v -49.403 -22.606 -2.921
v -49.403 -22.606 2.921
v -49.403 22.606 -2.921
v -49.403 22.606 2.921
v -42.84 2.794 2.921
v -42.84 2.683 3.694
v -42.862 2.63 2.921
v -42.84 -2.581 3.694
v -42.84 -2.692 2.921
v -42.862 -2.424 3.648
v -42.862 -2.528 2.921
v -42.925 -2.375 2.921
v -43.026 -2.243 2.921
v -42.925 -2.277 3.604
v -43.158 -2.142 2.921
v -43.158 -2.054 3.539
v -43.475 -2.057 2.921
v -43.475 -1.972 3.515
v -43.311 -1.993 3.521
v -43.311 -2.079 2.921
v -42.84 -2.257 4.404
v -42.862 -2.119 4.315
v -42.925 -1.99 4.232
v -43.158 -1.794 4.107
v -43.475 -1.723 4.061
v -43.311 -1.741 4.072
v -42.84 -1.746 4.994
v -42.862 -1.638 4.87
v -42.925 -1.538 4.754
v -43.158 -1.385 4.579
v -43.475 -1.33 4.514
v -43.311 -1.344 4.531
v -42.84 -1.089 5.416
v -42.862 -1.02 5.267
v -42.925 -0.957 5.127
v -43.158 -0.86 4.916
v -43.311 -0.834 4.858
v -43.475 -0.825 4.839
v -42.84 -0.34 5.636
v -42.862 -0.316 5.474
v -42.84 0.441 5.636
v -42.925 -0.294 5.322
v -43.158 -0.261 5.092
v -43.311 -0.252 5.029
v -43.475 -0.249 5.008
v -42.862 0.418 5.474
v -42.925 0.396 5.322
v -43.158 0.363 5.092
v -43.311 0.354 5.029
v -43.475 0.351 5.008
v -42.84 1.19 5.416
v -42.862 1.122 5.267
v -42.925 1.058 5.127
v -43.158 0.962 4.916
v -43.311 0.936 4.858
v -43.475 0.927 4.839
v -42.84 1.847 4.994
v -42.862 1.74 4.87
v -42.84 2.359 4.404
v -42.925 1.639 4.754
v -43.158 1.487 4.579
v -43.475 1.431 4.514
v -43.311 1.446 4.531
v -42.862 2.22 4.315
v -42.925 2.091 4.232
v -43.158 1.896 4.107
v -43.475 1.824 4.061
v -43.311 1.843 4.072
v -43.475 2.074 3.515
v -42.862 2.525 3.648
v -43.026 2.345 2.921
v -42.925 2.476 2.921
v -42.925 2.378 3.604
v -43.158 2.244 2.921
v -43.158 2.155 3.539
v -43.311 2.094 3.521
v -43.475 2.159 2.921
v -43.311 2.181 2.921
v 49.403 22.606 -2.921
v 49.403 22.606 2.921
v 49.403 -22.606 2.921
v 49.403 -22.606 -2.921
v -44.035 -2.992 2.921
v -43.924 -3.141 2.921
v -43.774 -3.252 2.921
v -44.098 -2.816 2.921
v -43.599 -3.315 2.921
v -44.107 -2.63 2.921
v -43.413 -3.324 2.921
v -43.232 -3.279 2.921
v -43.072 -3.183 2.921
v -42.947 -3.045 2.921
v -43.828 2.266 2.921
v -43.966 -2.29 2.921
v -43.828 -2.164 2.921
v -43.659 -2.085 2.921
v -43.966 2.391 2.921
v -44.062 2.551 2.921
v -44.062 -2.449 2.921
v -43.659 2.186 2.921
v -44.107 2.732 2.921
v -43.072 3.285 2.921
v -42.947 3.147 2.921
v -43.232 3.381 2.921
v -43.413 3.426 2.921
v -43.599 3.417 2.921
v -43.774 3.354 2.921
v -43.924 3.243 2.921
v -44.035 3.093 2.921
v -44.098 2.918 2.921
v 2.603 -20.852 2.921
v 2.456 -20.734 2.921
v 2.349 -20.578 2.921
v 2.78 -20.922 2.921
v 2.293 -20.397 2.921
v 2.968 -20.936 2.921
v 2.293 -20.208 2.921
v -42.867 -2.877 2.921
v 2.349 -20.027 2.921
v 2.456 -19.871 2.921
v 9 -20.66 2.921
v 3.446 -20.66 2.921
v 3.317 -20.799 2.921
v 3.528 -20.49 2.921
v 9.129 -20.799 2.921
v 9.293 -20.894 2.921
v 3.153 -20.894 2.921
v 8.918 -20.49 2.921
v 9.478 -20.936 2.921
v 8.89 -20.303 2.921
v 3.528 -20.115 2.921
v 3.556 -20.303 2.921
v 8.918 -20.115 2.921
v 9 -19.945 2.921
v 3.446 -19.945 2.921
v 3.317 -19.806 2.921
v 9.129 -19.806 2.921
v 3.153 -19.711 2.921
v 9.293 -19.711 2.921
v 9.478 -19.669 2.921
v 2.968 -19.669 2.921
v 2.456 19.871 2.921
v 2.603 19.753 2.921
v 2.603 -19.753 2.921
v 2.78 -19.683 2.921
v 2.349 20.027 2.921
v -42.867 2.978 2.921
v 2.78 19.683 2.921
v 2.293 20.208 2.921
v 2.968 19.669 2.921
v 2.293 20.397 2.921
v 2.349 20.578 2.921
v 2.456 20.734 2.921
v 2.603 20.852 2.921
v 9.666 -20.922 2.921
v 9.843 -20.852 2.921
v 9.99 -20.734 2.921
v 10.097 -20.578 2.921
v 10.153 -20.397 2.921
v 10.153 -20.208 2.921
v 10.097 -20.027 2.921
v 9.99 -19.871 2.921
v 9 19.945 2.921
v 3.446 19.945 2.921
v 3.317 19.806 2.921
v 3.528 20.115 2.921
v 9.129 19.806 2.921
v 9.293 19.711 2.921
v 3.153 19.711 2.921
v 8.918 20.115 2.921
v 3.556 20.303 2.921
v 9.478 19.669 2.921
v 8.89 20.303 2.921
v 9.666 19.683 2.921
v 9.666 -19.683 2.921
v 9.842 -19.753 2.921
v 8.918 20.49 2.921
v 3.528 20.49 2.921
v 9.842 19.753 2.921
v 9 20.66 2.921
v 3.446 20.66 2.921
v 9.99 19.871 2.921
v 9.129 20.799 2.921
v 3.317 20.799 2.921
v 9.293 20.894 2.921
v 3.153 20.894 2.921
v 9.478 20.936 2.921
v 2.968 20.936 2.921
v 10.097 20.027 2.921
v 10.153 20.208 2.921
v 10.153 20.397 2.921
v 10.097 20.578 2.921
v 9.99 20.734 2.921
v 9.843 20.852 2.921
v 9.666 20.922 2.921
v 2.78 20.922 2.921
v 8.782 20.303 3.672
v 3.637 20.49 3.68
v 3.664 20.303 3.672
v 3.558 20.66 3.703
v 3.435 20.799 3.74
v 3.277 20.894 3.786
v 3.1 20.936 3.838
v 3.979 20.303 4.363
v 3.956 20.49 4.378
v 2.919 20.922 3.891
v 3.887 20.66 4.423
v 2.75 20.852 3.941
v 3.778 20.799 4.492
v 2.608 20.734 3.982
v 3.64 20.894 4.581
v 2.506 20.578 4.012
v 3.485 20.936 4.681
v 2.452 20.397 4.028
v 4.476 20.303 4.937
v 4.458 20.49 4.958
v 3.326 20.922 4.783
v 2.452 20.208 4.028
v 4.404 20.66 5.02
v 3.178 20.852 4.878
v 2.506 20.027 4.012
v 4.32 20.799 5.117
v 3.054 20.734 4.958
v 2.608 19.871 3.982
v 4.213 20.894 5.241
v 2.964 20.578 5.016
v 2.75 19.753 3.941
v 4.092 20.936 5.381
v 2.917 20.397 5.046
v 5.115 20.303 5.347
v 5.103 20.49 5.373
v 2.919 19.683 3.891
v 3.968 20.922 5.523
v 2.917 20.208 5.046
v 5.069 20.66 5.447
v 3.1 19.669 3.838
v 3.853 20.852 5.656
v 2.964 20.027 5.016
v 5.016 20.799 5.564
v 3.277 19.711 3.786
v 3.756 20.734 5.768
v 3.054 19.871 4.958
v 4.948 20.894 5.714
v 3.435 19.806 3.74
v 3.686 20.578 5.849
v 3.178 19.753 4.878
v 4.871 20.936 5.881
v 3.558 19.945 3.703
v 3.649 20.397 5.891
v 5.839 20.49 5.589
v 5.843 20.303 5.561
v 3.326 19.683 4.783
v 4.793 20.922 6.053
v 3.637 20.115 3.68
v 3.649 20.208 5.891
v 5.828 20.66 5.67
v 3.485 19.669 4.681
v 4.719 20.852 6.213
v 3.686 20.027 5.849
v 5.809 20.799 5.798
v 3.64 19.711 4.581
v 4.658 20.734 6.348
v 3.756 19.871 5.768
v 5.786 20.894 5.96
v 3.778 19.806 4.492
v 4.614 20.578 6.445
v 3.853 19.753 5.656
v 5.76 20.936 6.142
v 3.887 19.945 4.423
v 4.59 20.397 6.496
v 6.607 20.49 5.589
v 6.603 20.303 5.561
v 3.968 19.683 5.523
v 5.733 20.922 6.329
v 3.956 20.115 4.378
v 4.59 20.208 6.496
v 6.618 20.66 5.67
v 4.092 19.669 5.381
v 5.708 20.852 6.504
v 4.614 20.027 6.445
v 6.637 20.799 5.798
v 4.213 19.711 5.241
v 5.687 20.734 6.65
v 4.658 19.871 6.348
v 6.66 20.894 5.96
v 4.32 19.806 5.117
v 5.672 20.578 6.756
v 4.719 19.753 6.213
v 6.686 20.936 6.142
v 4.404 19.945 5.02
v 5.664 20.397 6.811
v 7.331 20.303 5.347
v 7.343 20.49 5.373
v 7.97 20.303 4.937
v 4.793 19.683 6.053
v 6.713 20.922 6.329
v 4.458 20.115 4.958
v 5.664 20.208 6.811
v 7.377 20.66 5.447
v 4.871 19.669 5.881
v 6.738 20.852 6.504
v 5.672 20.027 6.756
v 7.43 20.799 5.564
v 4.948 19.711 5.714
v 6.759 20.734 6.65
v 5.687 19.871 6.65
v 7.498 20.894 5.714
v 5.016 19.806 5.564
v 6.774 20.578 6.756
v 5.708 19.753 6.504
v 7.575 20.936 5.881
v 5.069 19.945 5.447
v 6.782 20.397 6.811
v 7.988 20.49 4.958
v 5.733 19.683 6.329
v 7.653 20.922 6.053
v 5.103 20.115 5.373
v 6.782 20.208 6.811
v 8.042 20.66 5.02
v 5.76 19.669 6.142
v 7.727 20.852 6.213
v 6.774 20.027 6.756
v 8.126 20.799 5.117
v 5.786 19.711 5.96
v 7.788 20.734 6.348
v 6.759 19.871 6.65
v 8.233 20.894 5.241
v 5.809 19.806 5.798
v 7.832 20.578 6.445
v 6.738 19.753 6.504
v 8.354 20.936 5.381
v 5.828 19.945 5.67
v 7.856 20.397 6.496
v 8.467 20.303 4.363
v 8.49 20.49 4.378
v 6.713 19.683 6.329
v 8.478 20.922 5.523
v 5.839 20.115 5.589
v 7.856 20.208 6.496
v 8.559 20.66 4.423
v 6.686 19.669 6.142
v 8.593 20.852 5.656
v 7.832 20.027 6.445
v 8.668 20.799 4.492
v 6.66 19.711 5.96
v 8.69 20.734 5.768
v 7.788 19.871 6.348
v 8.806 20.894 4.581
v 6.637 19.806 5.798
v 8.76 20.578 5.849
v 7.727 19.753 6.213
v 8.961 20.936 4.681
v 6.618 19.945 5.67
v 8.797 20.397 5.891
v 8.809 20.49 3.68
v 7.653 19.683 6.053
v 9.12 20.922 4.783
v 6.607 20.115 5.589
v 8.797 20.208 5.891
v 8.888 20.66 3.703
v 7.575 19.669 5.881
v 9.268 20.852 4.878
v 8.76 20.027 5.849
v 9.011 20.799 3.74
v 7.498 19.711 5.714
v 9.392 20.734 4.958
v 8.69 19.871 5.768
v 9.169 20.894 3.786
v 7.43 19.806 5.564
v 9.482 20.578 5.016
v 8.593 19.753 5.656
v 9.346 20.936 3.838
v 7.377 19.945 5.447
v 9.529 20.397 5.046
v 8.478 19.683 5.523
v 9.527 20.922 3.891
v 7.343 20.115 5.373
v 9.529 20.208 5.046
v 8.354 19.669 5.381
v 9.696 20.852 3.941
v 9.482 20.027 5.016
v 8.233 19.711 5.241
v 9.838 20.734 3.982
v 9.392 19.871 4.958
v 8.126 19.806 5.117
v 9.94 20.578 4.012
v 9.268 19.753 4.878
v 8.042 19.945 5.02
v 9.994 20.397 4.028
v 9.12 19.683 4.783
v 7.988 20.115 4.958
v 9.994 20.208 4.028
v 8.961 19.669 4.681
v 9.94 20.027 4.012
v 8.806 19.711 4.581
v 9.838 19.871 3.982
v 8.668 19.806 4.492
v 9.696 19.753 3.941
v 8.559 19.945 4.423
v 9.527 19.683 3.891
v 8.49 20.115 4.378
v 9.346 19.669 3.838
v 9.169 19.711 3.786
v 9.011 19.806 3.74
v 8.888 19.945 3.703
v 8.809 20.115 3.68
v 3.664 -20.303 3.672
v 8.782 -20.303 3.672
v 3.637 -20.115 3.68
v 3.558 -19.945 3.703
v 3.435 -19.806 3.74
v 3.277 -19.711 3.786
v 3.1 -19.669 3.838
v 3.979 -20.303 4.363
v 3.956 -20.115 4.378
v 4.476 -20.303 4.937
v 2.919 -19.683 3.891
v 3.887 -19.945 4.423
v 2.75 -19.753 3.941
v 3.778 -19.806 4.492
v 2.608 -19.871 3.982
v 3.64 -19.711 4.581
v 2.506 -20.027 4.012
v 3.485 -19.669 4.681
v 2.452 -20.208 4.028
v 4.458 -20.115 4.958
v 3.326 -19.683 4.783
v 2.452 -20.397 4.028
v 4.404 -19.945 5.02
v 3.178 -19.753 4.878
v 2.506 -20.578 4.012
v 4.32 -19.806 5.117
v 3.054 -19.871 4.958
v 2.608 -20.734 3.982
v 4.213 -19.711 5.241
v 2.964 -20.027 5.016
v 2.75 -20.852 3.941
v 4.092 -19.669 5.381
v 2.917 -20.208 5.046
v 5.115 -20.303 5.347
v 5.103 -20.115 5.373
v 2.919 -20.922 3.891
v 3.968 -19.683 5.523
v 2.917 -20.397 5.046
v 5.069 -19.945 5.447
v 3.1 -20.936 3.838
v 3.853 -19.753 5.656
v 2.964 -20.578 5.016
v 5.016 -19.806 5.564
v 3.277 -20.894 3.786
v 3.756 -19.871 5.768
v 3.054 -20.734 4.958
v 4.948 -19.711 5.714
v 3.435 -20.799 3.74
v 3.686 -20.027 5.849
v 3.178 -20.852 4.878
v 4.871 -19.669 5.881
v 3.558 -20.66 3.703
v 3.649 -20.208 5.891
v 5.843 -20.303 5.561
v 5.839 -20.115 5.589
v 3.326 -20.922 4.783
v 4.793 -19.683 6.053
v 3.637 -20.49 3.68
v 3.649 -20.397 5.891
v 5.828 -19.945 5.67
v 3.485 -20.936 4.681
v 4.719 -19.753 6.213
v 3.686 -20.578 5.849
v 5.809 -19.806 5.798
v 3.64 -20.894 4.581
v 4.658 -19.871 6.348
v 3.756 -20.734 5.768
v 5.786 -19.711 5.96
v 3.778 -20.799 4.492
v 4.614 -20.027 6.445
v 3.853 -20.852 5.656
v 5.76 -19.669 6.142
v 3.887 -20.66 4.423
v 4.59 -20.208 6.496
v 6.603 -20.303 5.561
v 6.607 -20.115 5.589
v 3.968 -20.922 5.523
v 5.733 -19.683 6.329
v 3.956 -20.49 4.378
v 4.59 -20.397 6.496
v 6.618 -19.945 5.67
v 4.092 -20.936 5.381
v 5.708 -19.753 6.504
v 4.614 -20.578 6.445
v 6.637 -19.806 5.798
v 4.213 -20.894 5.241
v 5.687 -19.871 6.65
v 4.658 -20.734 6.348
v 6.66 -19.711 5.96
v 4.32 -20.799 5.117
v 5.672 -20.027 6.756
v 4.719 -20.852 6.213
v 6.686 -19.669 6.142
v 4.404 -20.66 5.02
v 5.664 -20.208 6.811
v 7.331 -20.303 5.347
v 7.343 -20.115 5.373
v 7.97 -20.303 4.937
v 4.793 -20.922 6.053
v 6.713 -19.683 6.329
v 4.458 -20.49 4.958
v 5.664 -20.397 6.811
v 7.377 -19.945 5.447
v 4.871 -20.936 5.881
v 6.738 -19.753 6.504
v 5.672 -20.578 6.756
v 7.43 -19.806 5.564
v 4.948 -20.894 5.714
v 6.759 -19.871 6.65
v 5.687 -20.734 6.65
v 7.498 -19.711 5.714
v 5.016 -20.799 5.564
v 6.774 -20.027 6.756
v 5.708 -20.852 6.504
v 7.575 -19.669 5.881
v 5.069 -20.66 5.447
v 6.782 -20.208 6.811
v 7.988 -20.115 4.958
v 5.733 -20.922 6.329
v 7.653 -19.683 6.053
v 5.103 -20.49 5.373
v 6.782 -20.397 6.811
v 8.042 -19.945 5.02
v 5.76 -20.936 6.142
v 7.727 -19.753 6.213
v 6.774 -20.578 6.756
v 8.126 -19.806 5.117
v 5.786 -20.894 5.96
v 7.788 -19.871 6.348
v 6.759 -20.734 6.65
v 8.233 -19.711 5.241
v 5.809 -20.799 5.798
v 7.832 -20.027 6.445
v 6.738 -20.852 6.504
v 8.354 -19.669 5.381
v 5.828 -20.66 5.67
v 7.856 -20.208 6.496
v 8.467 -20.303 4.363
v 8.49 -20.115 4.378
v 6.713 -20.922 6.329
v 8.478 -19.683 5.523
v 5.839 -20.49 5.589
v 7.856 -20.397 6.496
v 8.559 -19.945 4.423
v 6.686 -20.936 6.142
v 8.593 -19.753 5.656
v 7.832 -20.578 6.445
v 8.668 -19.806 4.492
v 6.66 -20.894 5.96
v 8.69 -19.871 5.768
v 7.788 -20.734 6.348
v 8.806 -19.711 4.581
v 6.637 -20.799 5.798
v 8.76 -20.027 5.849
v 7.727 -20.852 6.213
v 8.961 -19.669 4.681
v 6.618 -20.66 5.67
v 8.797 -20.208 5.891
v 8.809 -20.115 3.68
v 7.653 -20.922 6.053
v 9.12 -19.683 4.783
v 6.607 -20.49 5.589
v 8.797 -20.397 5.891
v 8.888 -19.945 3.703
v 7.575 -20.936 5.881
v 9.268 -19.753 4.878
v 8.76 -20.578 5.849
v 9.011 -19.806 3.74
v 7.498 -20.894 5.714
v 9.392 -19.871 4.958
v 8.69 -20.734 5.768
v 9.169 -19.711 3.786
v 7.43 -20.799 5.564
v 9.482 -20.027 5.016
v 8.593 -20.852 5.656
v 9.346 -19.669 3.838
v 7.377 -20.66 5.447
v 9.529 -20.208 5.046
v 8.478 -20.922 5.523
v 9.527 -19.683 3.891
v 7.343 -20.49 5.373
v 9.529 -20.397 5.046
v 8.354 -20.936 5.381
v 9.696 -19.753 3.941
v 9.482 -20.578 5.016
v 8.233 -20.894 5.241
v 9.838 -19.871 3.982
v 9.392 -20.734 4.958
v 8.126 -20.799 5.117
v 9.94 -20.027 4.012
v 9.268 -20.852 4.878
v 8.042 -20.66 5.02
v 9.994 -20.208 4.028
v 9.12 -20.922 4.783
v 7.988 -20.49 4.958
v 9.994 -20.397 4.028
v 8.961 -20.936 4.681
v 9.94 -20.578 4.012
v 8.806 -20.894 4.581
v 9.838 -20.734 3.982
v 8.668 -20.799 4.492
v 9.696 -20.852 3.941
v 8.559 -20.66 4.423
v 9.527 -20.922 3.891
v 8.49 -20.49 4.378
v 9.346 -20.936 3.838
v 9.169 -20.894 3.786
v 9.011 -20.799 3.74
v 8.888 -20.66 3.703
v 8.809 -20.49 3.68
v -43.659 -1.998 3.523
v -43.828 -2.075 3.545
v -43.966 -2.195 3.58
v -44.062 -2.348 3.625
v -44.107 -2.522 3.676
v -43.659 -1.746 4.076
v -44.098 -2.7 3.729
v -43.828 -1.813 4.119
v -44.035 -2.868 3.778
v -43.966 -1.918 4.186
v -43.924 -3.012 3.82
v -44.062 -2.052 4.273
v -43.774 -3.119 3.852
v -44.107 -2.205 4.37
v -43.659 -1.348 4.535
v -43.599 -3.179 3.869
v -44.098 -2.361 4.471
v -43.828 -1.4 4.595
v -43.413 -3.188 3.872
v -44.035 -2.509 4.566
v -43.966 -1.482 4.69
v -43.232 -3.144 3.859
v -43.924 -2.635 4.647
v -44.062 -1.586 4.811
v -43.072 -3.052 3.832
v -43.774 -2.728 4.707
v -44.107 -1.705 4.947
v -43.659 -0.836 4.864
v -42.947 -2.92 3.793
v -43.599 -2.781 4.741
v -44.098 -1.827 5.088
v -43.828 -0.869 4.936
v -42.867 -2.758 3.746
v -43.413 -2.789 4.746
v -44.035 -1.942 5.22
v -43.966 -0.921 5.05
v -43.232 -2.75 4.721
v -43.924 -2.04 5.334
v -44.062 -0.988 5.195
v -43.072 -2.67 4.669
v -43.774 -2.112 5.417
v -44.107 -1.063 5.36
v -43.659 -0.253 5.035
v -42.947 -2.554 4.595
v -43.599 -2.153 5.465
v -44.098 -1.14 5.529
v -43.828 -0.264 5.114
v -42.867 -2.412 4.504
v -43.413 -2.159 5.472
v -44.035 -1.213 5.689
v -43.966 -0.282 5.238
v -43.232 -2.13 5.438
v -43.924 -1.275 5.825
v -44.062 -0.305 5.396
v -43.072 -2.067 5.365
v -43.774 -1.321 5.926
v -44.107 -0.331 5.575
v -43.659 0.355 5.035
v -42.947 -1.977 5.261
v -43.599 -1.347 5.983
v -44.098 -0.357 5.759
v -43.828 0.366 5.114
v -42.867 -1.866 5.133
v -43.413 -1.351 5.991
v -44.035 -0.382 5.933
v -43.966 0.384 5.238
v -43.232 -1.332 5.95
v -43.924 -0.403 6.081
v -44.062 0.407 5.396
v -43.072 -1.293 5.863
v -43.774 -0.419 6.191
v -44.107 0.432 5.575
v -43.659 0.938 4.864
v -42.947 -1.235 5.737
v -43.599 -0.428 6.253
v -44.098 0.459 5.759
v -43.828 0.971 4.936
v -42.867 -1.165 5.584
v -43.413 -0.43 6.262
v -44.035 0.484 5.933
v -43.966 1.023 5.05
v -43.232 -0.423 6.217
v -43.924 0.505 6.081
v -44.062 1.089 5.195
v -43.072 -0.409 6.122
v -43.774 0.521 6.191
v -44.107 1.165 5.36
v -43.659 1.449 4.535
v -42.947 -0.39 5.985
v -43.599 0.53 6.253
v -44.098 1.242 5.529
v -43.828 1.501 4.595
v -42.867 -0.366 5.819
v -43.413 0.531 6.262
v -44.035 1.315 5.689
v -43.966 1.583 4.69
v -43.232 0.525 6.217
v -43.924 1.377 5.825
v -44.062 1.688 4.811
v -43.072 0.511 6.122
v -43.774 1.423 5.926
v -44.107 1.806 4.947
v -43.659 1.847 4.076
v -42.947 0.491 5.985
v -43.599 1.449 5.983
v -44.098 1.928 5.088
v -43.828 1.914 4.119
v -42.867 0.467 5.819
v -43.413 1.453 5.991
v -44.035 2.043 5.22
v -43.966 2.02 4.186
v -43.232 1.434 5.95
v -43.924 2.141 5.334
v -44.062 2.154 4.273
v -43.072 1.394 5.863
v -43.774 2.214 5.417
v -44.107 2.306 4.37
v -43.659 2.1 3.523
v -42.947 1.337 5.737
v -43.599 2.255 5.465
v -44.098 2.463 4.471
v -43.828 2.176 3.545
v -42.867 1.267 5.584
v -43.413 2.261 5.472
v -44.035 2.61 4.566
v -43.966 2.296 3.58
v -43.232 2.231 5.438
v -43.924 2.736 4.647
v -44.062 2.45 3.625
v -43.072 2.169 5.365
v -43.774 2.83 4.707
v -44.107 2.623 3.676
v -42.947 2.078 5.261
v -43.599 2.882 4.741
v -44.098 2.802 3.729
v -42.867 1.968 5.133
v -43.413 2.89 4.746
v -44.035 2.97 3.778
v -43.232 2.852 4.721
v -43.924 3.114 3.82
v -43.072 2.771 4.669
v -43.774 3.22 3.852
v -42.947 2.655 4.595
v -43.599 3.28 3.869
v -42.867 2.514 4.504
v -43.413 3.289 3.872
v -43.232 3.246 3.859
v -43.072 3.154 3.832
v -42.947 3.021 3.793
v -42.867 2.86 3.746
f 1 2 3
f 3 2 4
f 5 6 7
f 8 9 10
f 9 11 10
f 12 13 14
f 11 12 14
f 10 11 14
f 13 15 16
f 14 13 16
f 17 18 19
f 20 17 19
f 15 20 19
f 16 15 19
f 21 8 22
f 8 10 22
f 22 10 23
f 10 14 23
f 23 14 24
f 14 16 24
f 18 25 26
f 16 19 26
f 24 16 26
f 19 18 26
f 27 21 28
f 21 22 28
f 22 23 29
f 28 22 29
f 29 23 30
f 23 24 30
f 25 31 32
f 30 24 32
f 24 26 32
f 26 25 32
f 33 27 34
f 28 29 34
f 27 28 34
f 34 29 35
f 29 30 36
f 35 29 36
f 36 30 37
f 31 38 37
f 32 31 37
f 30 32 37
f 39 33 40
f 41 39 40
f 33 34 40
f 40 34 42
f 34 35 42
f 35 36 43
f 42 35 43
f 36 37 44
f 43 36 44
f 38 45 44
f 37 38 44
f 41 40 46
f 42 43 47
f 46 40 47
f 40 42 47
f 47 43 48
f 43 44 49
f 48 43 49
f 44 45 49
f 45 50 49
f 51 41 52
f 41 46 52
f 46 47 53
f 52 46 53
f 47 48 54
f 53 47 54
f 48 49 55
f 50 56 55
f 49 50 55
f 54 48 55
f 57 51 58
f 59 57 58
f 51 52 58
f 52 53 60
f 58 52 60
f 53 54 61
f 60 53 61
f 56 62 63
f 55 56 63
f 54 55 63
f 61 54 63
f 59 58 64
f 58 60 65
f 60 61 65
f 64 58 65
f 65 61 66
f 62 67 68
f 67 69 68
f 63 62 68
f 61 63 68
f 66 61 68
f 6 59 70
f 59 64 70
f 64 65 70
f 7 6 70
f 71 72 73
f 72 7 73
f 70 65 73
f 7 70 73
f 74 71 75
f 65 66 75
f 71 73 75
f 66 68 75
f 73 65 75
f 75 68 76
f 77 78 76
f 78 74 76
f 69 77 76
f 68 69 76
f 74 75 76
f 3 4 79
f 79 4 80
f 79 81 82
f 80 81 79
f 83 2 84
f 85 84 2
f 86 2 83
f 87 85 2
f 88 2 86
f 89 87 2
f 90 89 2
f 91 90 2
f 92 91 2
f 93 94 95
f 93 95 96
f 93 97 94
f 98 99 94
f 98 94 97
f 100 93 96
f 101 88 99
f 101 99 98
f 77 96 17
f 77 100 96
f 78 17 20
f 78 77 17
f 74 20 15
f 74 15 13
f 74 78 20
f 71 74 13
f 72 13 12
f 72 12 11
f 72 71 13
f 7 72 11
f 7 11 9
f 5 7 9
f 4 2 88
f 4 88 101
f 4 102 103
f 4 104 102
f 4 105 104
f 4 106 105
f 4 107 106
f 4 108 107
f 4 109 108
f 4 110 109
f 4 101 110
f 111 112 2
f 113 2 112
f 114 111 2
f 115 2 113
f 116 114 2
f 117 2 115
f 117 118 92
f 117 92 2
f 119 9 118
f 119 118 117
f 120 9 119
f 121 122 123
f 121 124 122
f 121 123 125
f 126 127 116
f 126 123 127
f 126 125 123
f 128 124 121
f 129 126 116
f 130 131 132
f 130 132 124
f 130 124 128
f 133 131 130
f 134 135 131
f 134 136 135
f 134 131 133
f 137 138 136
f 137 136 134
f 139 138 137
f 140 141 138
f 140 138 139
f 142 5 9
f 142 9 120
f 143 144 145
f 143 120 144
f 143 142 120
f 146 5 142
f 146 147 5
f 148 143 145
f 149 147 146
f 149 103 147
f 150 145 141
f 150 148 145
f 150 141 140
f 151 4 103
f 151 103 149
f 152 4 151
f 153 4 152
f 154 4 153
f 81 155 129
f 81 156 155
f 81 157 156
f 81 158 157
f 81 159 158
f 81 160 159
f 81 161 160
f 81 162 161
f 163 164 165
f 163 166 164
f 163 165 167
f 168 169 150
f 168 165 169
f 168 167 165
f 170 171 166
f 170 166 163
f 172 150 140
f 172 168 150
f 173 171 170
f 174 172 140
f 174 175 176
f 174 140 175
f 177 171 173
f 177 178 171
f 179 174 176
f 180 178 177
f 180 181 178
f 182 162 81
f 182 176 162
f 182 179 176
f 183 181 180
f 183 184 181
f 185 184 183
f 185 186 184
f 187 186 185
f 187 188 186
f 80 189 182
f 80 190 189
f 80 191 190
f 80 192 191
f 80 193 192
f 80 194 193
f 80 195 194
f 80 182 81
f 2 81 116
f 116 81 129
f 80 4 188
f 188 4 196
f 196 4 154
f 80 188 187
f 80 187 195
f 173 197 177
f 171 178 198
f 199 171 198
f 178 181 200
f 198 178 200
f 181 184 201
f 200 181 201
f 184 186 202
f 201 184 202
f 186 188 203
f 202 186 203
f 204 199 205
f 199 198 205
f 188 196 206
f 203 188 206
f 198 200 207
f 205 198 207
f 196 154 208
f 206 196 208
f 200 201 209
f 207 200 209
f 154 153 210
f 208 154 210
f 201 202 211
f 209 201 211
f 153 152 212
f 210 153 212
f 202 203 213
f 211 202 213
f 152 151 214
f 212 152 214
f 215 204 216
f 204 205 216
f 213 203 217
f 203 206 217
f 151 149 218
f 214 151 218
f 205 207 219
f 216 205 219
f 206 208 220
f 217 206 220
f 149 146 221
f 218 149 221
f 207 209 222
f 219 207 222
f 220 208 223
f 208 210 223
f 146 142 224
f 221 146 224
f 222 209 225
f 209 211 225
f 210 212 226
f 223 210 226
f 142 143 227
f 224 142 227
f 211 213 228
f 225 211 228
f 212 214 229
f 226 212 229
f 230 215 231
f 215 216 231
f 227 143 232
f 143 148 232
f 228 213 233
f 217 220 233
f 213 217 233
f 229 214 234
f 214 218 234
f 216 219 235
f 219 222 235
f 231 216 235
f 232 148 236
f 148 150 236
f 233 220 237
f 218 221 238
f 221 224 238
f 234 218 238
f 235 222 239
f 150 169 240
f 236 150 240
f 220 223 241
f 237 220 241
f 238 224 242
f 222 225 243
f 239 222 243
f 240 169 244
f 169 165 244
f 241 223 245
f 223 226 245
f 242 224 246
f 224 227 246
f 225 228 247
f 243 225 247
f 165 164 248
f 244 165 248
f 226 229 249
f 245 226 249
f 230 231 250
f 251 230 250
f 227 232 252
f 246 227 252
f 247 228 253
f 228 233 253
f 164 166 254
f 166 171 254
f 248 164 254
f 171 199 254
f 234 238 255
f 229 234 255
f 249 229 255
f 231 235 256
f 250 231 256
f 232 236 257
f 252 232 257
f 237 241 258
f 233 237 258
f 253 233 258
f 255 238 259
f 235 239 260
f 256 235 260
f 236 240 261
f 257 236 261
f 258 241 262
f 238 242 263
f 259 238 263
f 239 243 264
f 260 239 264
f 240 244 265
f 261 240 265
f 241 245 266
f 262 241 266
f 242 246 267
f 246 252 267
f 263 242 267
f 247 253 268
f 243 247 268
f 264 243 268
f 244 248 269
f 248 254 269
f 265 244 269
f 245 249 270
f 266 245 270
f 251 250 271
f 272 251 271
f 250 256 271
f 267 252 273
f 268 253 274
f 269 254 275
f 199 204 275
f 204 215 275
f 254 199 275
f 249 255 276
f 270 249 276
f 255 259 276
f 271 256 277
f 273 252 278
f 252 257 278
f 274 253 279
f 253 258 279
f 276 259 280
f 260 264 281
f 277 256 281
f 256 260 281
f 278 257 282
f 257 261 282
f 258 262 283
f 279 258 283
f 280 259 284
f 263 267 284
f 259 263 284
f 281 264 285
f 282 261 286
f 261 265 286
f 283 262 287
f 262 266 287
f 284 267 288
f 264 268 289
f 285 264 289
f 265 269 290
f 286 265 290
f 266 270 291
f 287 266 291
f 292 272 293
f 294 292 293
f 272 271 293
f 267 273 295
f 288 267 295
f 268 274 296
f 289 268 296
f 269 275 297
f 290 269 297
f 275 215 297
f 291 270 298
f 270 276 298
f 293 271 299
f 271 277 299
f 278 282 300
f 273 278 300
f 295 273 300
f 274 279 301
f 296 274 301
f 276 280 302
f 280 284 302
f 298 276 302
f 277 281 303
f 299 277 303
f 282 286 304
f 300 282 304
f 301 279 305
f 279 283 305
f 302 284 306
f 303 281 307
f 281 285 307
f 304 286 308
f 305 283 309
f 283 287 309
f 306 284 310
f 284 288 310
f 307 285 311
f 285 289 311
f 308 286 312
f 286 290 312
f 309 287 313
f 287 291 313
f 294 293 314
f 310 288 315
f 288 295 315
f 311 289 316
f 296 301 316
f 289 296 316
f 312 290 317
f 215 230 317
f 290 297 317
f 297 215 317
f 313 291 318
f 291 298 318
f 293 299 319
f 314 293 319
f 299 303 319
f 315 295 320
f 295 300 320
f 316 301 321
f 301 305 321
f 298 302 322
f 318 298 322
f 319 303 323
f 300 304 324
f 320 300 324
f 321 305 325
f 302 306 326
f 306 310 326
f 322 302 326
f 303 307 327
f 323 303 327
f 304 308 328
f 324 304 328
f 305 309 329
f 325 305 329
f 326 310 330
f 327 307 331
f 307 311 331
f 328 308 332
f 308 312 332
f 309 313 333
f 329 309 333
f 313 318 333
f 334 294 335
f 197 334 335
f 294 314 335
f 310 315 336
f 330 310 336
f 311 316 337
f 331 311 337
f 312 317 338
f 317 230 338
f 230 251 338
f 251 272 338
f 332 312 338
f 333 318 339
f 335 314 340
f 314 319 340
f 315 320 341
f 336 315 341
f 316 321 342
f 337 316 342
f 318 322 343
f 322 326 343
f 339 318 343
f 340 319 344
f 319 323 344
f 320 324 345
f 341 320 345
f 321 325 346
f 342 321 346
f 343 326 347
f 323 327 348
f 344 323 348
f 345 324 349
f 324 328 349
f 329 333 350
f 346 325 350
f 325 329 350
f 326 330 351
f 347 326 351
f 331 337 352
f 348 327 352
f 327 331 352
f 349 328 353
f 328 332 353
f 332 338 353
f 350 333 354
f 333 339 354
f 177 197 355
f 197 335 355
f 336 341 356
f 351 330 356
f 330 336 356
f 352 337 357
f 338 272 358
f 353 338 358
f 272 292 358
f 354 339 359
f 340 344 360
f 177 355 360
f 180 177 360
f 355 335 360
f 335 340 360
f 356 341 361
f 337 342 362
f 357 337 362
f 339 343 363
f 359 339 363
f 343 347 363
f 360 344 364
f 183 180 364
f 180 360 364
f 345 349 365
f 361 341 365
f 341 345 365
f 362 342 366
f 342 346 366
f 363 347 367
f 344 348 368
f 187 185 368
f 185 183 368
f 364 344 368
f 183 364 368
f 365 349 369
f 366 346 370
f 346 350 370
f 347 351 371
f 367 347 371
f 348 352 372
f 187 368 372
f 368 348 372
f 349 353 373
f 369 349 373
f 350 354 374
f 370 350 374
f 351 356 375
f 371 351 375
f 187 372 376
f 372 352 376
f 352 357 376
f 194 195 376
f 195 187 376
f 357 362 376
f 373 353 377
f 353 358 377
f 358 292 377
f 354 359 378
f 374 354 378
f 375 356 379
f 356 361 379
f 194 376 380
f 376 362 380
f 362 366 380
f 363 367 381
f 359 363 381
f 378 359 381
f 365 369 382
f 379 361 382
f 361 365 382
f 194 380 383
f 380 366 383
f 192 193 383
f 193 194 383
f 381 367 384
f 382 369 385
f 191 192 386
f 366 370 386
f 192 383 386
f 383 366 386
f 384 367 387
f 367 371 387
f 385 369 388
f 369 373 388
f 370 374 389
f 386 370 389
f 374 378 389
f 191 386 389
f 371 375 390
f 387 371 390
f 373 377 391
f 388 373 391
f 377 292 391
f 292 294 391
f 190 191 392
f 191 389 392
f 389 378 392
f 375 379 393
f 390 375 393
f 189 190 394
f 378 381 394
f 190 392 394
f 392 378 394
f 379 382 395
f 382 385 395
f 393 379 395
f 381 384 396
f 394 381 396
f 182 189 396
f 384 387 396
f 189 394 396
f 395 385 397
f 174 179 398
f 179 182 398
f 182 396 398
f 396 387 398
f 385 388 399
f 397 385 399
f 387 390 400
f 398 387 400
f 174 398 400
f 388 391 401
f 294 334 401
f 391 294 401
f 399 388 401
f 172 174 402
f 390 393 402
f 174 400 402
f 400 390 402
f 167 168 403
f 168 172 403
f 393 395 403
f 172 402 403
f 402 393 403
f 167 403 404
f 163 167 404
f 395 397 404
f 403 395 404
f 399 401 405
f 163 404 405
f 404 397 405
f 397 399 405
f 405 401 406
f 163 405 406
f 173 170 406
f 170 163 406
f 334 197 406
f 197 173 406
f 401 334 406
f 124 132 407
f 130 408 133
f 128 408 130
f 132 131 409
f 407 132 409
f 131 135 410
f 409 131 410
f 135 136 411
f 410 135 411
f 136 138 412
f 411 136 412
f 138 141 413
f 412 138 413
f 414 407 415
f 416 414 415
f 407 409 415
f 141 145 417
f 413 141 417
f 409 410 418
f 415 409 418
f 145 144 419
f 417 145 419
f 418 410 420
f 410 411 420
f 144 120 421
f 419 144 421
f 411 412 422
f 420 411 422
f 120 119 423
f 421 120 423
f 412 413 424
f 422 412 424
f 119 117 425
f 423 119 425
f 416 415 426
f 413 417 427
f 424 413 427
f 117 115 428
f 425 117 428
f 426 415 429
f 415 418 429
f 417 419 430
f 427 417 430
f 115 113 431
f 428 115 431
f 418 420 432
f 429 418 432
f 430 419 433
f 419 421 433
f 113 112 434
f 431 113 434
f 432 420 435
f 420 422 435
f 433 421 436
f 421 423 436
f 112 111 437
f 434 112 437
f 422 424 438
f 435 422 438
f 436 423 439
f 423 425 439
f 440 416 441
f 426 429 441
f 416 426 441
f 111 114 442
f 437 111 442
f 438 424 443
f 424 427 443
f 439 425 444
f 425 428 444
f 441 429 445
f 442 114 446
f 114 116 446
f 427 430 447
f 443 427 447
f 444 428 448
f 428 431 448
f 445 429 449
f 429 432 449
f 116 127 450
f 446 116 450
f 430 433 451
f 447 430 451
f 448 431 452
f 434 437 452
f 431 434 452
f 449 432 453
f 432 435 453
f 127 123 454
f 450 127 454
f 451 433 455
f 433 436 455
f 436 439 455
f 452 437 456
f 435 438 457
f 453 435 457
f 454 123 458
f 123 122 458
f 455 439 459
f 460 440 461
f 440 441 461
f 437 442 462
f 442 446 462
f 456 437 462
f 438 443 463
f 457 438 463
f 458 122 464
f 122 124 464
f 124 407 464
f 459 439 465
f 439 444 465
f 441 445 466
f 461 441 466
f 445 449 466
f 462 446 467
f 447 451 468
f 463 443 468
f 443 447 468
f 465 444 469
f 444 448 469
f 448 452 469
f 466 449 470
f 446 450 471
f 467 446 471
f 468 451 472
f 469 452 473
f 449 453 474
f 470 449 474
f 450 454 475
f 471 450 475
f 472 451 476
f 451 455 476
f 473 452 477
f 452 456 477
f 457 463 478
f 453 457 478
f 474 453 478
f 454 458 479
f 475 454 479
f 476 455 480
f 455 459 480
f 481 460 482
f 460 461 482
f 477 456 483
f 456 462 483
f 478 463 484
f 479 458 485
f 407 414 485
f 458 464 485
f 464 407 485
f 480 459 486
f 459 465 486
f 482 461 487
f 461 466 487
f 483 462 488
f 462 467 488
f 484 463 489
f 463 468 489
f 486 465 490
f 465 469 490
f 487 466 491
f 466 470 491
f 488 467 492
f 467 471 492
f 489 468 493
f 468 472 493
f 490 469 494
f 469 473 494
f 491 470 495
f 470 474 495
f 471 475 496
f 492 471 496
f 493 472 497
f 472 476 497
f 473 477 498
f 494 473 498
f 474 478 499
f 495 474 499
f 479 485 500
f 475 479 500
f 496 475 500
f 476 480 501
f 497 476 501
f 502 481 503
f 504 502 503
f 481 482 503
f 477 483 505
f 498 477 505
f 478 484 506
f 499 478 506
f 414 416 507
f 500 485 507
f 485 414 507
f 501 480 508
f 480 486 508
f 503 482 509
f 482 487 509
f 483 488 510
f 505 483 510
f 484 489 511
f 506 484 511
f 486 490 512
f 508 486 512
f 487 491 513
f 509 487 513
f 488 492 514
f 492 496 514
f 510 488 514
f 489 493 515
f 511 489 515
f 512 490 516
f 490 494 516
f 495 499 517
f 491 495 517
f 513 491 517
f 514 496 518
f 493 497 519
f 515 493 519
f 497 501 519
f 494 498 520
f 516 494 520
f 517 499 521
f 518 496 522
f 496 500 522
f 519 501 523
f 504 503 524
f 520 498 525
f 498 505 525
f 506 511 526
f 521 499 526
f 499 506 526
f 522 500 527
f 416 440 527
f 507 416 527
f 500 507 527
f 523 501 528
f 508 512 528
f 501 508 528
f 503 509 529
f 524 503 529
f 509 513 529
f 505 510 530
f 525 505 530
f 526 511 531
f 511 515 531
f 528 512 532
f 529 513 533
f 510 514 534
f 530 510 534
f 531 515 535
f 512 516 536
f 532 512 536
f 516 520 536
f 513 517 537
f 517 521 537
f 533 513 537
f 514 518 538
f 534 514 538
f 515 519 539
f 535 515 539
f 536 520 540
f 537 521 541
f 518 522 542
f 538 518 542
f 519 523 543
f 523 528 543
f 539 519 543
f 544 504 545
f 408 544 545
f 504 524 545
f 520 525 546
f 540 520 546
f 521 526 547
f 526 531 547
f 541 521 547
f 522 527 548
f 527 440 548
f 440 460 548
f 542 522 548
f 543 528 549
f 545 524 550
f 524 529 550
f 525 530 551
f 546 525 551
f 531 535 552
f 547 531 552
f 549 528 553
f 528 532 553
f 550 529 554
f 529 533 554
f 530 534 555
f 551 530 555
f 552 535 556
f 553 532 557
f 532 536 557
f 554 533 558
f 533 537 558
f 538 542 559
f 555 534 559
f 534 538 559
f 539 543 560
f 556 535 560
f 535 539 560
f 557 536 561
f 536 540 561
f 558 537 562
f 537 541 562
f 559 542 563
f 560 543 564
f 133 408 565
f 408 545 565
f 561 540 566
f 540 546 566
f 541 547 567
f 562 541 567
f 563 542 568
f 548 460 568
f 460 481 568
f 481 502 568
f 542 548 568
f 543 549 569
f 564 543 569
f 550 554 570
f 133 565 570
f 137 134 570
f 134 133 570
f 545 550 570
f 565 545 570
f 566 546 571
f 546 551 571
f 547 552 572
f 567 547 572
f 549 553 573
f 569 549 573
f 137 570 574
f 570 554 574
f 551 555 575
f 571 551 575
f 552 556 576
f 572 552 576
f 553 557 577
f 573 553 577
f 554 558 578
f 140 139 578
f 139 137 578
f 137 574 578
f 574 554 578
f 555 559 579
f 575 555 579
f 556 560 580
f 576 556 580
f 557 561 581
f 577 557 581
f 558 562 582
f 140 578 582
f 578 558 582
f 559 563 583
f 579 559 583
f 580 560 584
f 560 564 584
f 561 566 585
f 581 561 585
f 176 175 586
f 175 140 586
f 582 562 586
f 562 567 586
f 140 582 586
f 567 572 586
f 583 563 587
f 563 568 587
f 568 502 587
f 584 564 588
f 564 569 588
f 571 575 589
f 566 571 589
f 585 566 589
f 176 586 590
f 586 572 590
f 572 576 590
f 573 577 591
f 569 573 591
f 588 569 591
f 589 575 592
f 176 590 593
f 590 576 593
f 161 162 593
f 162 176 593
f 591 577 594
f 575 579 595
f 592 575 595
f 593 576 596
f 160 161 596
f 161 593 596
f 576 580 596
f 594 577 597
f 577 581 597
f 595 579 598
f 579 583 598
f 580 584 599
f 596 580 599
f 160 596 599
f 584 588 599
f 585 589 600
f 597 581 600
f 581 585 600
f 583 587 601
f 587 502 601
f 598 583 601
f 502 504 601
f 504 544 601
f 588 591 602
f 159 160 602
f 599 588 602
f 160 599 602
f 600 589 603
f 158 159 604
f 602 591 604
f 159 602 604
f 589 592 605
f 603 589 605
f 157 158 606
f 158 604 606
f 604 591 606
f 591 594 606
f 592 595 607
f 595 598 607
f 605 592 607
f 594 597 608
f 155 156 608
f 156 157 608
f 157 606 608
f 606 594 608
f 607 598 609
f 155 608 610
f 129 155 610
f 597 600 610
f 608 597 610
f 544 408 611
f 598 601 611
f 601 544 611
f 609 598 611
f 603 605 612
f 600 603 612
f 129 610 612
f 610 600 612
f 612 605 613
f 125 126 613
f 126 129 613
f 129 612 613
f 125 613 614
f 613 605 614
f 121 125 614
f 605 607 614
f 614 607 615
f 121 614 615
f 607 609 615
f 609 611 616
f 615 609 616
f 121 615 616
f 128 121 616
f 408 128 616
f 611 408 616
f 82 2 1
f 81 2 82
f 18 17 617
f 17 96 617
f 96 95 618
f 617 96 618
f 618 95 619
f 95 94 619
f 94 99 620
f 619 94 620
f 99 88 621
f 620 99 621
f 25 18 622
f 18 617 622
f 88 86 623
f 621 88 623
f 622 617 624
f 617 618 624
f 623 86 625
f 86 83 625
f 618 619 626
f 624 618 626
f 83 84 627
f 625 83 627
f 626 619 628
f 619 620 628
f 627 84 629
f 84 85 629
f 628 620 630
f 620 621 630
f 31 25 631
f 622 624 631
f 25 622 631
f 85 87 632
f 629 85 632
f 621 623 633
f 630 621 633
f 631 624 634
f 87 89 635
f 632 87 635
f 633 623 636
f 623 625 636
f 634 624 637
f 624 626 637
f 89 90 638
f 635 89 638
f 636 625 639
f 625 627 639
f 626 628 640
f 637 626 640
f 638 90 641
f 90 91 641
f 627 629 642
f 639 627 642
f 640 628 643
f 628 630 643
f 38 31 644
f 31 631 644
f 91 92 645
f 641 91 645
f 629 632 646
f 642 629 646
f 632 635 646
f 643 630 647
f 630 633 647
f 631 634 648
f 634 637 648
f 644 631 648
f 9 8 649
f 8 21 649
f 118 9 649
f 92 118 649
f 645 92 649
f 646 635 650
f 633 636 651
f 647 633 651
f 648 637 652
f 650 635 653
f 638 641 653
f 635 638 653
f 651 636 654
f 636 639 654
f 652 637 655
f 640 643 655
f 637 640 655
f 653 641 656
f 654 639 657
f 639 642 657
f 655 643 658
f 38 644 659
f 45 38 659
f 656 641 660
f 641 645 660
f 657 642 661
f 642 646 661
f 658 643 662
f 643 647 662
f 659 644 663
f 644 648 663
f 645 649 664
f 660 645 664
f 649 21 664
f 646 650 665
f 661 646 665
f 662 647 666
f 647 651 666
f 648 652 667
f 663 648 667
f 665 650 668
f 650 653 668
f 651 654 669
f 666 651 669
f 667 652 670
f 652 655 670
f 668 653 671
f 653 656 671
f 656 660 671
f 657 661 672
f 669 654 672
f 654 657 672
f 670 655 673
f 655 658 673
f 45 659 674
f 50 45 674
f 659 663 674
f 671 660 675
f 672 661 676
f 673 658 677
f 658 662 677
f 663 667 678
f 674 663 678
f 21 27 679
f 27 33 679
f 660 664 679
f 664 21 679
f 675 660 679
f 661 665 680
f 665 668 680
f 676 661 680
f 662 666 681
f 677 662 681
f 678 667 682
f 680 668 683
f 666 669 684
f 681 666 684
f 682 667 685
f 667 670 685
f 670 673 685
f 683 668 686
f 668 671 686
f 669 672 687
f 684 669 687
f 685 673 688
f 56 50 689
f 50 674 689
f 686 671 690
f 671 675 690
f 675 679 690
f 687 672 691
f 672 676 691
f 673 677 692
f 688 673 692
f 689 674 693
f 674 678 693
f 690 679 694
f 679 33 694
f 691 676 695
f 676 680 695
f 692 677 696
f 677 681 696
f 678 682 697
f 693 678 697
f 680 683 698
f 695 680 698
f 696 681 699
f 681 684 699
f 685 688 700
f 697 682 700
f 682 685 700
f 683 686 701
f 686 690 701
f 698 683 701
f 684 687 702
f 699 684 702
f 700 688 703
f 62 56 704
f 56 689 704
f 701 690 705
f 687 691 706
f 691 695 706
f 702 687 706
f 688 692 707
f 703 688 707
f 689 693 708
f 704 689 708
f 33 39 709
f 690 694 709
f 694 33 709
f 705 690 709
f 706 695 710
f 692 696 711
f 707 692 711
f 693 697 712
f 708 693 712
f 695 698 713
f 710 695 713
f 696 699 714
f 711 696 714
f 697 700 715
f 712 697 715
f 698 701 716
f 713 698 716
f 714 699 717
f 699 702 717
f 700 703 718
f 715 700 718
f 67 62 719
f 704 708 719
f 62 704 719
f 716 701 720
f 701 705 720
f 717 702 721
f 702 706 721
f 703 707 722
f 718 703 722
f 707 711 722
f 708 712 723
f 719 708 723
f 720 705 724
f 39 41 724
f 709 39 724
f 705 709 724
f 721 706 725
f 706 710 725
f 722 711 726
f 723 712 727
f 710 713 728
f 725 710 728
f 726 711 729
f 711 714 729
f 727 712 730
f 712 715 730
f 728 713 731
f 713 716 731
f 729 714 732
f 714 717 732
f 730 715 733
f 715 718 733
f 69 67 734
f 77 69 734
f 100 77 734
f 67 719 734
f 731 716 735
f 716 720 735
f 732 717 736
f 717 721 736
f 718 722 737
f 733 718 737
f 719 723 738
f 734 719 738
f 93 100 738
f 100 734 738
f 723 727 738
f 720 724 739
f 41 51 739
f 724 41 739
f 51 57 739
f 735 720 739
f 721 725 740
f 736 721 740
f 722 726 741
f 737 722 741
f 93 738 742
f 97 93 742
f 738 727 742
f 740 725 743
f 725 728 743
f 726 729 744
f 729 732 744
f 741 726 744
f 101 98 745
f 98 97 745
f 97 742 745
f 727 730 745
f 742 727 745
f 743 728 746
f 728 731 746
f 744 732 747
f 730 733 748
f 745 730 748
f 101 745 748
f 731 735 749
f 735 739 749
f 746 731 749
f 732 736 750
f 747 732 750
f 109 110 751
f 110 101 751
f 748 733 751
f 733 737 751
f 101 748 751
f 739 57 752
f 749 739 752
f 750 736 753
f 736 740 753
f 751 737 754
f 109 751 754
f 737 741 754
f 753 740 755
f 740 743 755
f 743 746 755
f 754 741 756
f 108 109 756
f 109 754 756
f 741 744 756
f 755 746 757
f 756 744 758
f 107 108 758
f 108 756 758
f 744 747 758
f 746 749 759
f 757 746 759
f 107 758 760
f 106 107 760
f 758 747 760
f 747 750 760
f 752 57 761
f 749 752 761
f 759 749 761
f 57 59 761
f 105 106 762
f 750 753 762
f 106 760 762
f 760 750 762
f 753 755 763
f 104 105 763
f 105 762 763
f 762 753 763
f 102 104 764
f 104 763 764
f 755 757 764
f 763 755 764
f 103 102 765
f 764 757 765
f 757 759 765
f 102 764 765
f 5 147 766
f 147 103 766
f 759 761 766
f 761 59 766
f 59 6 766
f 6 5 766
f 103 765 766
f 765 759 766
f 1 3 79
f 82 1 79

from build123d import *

# Parameters (mm, degrees)
F0_W     = 98.806
F0_H     = 45.212
F1_DEPTH = 2.921
F3_ANGLE = 180
F6_R     = 0.635


# Not quite as in the source:
# - the program builds the solid bodies; features that only make, move or delete a surface that nothing else refers to are left out


with BuildPart() as f1:
    # F0 (on Top) → F1 (new body, symmetric)
    with BuildSketch(Plane.XY):
        Rectangle(F0_W, F0_H)
    extrude(amount=F1_DEPTH, both=True)

    # F2 (on face) → F3 (revolve)
    with BuildSketch(Plane.XY.offset(2.921)):
        with BuildLine():
            ThreePointArc((-43.4750802815, 2.159), (-43.0260674754, 2.3449871939), (-42.8400802815, 2.794))
            ThreePointArc((-42.8400802815, 2.794), (-43.9240930875, 3.2430128061), (-43.4750802815, 2.159))
        make_face()
        with BuildLine():
            ThreePointArc((-42.8400802815, -2.6924), (-43.0260674754, -2.2433871939), (-43.4750802815, -2.0574))
            ThreePointArc((-43.4750802815, -2.0574), (-43.9240930875, -3.1414128061), (-42.8400802815, -2.6924))
        make_face()
    revolve(axis=Axis((-43.6497014016, 0.0508, 2.921), (-1, 0, 0)), revolution_arc=F3_ANGLE)

    # F6 (on face) → F7 (revolve)
    with BuildSketch(Plane.XY.offset(2.921)):
        with Locations((2.921, -20.3025657684)):
            Circle(F6_R)
        with BuildLine():
            ThreePointArc((10.16, -20.3025657684), (9.525, -19.6675657684), (8.89, -20.3025657684))
            ThreePointArc((8.89, -20.3025657684), (9.525, -20.9375657684), (10.16, -20.3025657684))
        make_face()
        with Locations((2.921, 20.3025657684)):
            Circle(F6_R)
        with BuildLine():
            ThreePointArc((10.16, 20.3025657684), (9.525, 20.9375657684), (8.89, 20.3025657684))
            ThreePointArc((8.89, 20.3025657684), (9.525, 19.6675657684), (10.16, 20.3025657684))
        make_face()
    revolve(axis=Axis((6.223, -20.2974760905, 2.921), (0, 1, 0)))


solid = f1.part
